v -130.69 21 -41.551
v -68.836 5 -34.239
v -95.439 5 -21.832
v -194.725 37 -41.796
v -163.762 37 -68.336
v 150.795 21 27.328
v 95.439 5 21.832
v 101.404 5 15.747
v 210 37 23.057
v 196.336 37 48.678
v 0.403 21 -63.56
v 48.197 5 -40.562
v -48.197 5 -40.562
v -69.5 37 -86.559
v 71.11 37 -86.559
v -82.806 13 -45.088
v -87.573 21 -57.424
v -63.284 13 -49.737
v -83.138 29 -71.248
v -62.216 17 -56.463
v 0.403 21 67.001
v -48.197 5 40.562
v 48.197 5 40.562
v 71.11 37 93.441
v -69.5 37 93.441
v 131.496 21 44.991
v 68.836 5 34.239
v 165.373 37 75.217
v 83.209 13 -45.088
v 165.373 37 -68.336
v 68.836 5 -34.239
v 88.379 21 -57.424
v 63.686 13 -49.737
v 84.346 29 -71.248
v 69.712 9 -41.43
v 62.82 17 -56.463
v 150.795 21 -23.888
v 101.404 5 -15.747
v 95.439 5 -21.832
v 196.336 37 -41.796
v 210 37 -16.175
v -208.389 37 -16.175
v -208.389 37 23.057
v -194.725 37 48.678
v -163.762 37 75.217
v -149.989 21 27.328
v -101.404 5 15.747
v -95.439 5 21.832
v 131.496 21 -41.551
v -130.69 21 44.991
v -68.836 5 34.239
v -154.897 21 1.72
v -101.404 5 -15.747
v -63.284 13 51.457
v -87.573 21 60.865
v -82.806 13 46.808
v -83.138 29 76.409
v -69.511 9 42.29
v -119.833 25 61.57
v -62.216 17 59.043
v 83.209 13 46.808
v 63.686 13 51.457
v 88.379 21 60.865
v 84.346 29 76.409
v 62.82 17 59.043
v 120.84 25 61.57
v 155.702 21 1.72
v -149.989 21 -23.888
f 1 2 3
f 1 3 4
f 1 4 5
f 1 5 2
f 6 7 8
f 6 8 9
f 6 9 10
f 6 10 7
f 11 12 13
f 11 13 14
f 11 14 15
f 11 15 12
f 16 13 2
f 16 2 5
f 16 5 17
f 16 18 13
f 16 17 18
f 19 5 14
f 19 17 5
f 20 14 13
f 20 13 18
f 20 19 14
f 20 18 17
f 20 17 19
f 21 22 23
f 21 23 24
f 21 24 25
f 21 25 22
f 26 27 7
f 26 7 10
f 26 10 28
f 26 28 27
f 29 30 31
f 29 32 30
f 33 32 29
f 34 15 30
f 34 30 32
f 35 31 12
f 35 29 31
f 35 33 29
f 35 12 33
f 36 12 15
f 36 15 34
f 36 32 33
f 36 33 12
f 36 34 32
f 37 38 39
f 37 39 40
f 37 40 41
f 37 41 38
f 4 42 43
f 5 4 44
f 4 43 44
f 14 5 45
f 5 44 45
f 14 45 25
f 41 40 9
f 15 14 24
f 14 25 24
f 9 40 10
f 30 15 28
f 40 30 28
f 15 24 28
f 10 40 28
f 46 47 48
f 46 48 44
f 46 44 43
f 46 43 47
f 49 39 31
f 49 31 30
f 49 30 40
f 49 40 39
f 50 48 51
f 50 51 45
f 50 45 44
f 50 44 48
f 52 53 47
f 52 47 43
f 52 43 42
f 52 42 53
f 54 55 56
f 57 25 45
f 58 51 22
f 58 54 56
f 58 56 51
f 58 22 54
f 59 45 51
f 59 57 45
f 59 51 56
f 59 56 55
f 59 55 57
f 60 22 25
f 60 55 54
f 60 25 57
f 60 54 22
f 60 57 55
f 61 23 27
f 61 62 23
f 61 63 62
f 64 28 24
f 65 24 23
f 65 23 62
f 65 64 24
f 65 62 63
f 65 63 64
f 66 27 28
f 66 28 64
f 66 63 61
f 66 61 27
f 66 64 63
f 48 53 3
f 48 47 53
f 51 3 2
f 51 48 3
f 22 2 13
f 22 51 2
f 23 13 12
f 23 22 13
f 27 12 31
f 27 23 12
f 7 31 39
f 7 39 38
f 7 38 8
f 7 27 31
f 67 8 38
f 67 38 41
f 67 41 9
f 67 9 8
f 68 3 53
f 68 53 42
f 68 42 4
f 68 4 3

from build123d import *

# Parameters (mm, degrees)
BOSS_EXTRUDE1_DEPTH     = 5
CUT_EXTRUDE2_DEPTH      = 100
CUT_EXTRUDE2_DEPTH_BACK = 100


with BuildPart() as part:
    # Sketch1 → Boss-Extrude1 (new body)
    with BuildSketch(Plane(origin=(0, 0, 0), x_dir=(1, 0, 0), z_dir=(0, 1, 0))):
        Polygon((48.196890285, 40.561739349), (-48.196890285, 40.561739349), (-68.835657659, 34.23887998), (-95.439386703, 21.831759708), (-101.404348372, 15.747498806), (-101.404348372, -15.747498806), (-95.439386703, -21.831759708), (-68.835657659, -34.23887998), (-48.196890285, -40.561739349), (48.196890285, -40.561739349), (68.835657659, -34.23887998), (95.439386703, -21.831759708), (101.404348372, -15.747498806), (101.404348372, 15.747498806), (95.439386703, 21.831759708), (68.835657659, 34.23887998), align=None)
    extrude(amount=BOSS_EXTRUDE1_DEPTH)

    # Sketch2 → section 1 of loft2
    with BuildSketch(Plane(origin=(0, 37, 0), x_dir=(1, 0, 0), z_dir=(0, 1, 0)), mode=Mode.PRIVATE) as loft2_s1:
        with BuildLine():
            Line((-69.499566366, 86.559191019), (71.110487868, 86.559191019))
            Line((71.110487868, 86.559191019), (165.372648179, 68.335699669))
            Line((165.372648179, 68.335699669), (196.335556079, 41.796064326))
            Line((196.335556079, 41.796064326), (210, 16.175231975))
            Line((210, 16.175231975), (210, -23.056849936))
            Line((210, -23.056849936), (196.335556079, -48.677682288))
            Line((196.335556079, -48.677682288), (165.372648179, -75.217317631))
            Line((165.372648179, -75.217317631), (71.110487868, -93.440808981))
            Line((71.110487868, -93.440808981), (-69.499566366, -93.440808981))
            Line((-69.499566366, -93.440808981), (-163.761726677, -75.217317631))
            Line((-163.761726677, -75.217317631), (-194.724634578, -48.677682288))
            Line((-194.724634578, -48.677682288), (-208.389078498, -23.056849936))
            Line((-208.389078498, -23.056849936), (-208.389078498, 16.175231975))
            Line((-208.389078498, 16.175231975), (-194.724634578, 41.796064326))
            Line((-194.724634578, 41.796064326), (-163.761726677, 68.335699669))
            Line((-163.761726677, 68.335699669), (-69.499566366, 86.559191019))
        make_face()
    # loft from a face of the part (loft2)
    loft([part.faces().sort_by_distance((0, 5, 0))[0], loft2_s1.sketch])

    # Sketch4 → Cut-Extrude2 (cut, two sides: drawn at the far end of the back side and taken through both)
    with BuildSketch(Plane.XY.offset(-CUT_EXTRUDE2_DEPTH_BACK)):
        Polygon((-101.404348372, 5), (121.036097522, 5), (118.786130404, -29.699429441), (-111.783228991, -29.699429441), (-101.404348372, -4.949791143), align=None)
    extrude(amount=CUT_EXTRUDE2_DEPTH + CUT_EXTRUDE2_DEPTH_BACK, mode=Mode.SUBTRACT)


solid = part.part
